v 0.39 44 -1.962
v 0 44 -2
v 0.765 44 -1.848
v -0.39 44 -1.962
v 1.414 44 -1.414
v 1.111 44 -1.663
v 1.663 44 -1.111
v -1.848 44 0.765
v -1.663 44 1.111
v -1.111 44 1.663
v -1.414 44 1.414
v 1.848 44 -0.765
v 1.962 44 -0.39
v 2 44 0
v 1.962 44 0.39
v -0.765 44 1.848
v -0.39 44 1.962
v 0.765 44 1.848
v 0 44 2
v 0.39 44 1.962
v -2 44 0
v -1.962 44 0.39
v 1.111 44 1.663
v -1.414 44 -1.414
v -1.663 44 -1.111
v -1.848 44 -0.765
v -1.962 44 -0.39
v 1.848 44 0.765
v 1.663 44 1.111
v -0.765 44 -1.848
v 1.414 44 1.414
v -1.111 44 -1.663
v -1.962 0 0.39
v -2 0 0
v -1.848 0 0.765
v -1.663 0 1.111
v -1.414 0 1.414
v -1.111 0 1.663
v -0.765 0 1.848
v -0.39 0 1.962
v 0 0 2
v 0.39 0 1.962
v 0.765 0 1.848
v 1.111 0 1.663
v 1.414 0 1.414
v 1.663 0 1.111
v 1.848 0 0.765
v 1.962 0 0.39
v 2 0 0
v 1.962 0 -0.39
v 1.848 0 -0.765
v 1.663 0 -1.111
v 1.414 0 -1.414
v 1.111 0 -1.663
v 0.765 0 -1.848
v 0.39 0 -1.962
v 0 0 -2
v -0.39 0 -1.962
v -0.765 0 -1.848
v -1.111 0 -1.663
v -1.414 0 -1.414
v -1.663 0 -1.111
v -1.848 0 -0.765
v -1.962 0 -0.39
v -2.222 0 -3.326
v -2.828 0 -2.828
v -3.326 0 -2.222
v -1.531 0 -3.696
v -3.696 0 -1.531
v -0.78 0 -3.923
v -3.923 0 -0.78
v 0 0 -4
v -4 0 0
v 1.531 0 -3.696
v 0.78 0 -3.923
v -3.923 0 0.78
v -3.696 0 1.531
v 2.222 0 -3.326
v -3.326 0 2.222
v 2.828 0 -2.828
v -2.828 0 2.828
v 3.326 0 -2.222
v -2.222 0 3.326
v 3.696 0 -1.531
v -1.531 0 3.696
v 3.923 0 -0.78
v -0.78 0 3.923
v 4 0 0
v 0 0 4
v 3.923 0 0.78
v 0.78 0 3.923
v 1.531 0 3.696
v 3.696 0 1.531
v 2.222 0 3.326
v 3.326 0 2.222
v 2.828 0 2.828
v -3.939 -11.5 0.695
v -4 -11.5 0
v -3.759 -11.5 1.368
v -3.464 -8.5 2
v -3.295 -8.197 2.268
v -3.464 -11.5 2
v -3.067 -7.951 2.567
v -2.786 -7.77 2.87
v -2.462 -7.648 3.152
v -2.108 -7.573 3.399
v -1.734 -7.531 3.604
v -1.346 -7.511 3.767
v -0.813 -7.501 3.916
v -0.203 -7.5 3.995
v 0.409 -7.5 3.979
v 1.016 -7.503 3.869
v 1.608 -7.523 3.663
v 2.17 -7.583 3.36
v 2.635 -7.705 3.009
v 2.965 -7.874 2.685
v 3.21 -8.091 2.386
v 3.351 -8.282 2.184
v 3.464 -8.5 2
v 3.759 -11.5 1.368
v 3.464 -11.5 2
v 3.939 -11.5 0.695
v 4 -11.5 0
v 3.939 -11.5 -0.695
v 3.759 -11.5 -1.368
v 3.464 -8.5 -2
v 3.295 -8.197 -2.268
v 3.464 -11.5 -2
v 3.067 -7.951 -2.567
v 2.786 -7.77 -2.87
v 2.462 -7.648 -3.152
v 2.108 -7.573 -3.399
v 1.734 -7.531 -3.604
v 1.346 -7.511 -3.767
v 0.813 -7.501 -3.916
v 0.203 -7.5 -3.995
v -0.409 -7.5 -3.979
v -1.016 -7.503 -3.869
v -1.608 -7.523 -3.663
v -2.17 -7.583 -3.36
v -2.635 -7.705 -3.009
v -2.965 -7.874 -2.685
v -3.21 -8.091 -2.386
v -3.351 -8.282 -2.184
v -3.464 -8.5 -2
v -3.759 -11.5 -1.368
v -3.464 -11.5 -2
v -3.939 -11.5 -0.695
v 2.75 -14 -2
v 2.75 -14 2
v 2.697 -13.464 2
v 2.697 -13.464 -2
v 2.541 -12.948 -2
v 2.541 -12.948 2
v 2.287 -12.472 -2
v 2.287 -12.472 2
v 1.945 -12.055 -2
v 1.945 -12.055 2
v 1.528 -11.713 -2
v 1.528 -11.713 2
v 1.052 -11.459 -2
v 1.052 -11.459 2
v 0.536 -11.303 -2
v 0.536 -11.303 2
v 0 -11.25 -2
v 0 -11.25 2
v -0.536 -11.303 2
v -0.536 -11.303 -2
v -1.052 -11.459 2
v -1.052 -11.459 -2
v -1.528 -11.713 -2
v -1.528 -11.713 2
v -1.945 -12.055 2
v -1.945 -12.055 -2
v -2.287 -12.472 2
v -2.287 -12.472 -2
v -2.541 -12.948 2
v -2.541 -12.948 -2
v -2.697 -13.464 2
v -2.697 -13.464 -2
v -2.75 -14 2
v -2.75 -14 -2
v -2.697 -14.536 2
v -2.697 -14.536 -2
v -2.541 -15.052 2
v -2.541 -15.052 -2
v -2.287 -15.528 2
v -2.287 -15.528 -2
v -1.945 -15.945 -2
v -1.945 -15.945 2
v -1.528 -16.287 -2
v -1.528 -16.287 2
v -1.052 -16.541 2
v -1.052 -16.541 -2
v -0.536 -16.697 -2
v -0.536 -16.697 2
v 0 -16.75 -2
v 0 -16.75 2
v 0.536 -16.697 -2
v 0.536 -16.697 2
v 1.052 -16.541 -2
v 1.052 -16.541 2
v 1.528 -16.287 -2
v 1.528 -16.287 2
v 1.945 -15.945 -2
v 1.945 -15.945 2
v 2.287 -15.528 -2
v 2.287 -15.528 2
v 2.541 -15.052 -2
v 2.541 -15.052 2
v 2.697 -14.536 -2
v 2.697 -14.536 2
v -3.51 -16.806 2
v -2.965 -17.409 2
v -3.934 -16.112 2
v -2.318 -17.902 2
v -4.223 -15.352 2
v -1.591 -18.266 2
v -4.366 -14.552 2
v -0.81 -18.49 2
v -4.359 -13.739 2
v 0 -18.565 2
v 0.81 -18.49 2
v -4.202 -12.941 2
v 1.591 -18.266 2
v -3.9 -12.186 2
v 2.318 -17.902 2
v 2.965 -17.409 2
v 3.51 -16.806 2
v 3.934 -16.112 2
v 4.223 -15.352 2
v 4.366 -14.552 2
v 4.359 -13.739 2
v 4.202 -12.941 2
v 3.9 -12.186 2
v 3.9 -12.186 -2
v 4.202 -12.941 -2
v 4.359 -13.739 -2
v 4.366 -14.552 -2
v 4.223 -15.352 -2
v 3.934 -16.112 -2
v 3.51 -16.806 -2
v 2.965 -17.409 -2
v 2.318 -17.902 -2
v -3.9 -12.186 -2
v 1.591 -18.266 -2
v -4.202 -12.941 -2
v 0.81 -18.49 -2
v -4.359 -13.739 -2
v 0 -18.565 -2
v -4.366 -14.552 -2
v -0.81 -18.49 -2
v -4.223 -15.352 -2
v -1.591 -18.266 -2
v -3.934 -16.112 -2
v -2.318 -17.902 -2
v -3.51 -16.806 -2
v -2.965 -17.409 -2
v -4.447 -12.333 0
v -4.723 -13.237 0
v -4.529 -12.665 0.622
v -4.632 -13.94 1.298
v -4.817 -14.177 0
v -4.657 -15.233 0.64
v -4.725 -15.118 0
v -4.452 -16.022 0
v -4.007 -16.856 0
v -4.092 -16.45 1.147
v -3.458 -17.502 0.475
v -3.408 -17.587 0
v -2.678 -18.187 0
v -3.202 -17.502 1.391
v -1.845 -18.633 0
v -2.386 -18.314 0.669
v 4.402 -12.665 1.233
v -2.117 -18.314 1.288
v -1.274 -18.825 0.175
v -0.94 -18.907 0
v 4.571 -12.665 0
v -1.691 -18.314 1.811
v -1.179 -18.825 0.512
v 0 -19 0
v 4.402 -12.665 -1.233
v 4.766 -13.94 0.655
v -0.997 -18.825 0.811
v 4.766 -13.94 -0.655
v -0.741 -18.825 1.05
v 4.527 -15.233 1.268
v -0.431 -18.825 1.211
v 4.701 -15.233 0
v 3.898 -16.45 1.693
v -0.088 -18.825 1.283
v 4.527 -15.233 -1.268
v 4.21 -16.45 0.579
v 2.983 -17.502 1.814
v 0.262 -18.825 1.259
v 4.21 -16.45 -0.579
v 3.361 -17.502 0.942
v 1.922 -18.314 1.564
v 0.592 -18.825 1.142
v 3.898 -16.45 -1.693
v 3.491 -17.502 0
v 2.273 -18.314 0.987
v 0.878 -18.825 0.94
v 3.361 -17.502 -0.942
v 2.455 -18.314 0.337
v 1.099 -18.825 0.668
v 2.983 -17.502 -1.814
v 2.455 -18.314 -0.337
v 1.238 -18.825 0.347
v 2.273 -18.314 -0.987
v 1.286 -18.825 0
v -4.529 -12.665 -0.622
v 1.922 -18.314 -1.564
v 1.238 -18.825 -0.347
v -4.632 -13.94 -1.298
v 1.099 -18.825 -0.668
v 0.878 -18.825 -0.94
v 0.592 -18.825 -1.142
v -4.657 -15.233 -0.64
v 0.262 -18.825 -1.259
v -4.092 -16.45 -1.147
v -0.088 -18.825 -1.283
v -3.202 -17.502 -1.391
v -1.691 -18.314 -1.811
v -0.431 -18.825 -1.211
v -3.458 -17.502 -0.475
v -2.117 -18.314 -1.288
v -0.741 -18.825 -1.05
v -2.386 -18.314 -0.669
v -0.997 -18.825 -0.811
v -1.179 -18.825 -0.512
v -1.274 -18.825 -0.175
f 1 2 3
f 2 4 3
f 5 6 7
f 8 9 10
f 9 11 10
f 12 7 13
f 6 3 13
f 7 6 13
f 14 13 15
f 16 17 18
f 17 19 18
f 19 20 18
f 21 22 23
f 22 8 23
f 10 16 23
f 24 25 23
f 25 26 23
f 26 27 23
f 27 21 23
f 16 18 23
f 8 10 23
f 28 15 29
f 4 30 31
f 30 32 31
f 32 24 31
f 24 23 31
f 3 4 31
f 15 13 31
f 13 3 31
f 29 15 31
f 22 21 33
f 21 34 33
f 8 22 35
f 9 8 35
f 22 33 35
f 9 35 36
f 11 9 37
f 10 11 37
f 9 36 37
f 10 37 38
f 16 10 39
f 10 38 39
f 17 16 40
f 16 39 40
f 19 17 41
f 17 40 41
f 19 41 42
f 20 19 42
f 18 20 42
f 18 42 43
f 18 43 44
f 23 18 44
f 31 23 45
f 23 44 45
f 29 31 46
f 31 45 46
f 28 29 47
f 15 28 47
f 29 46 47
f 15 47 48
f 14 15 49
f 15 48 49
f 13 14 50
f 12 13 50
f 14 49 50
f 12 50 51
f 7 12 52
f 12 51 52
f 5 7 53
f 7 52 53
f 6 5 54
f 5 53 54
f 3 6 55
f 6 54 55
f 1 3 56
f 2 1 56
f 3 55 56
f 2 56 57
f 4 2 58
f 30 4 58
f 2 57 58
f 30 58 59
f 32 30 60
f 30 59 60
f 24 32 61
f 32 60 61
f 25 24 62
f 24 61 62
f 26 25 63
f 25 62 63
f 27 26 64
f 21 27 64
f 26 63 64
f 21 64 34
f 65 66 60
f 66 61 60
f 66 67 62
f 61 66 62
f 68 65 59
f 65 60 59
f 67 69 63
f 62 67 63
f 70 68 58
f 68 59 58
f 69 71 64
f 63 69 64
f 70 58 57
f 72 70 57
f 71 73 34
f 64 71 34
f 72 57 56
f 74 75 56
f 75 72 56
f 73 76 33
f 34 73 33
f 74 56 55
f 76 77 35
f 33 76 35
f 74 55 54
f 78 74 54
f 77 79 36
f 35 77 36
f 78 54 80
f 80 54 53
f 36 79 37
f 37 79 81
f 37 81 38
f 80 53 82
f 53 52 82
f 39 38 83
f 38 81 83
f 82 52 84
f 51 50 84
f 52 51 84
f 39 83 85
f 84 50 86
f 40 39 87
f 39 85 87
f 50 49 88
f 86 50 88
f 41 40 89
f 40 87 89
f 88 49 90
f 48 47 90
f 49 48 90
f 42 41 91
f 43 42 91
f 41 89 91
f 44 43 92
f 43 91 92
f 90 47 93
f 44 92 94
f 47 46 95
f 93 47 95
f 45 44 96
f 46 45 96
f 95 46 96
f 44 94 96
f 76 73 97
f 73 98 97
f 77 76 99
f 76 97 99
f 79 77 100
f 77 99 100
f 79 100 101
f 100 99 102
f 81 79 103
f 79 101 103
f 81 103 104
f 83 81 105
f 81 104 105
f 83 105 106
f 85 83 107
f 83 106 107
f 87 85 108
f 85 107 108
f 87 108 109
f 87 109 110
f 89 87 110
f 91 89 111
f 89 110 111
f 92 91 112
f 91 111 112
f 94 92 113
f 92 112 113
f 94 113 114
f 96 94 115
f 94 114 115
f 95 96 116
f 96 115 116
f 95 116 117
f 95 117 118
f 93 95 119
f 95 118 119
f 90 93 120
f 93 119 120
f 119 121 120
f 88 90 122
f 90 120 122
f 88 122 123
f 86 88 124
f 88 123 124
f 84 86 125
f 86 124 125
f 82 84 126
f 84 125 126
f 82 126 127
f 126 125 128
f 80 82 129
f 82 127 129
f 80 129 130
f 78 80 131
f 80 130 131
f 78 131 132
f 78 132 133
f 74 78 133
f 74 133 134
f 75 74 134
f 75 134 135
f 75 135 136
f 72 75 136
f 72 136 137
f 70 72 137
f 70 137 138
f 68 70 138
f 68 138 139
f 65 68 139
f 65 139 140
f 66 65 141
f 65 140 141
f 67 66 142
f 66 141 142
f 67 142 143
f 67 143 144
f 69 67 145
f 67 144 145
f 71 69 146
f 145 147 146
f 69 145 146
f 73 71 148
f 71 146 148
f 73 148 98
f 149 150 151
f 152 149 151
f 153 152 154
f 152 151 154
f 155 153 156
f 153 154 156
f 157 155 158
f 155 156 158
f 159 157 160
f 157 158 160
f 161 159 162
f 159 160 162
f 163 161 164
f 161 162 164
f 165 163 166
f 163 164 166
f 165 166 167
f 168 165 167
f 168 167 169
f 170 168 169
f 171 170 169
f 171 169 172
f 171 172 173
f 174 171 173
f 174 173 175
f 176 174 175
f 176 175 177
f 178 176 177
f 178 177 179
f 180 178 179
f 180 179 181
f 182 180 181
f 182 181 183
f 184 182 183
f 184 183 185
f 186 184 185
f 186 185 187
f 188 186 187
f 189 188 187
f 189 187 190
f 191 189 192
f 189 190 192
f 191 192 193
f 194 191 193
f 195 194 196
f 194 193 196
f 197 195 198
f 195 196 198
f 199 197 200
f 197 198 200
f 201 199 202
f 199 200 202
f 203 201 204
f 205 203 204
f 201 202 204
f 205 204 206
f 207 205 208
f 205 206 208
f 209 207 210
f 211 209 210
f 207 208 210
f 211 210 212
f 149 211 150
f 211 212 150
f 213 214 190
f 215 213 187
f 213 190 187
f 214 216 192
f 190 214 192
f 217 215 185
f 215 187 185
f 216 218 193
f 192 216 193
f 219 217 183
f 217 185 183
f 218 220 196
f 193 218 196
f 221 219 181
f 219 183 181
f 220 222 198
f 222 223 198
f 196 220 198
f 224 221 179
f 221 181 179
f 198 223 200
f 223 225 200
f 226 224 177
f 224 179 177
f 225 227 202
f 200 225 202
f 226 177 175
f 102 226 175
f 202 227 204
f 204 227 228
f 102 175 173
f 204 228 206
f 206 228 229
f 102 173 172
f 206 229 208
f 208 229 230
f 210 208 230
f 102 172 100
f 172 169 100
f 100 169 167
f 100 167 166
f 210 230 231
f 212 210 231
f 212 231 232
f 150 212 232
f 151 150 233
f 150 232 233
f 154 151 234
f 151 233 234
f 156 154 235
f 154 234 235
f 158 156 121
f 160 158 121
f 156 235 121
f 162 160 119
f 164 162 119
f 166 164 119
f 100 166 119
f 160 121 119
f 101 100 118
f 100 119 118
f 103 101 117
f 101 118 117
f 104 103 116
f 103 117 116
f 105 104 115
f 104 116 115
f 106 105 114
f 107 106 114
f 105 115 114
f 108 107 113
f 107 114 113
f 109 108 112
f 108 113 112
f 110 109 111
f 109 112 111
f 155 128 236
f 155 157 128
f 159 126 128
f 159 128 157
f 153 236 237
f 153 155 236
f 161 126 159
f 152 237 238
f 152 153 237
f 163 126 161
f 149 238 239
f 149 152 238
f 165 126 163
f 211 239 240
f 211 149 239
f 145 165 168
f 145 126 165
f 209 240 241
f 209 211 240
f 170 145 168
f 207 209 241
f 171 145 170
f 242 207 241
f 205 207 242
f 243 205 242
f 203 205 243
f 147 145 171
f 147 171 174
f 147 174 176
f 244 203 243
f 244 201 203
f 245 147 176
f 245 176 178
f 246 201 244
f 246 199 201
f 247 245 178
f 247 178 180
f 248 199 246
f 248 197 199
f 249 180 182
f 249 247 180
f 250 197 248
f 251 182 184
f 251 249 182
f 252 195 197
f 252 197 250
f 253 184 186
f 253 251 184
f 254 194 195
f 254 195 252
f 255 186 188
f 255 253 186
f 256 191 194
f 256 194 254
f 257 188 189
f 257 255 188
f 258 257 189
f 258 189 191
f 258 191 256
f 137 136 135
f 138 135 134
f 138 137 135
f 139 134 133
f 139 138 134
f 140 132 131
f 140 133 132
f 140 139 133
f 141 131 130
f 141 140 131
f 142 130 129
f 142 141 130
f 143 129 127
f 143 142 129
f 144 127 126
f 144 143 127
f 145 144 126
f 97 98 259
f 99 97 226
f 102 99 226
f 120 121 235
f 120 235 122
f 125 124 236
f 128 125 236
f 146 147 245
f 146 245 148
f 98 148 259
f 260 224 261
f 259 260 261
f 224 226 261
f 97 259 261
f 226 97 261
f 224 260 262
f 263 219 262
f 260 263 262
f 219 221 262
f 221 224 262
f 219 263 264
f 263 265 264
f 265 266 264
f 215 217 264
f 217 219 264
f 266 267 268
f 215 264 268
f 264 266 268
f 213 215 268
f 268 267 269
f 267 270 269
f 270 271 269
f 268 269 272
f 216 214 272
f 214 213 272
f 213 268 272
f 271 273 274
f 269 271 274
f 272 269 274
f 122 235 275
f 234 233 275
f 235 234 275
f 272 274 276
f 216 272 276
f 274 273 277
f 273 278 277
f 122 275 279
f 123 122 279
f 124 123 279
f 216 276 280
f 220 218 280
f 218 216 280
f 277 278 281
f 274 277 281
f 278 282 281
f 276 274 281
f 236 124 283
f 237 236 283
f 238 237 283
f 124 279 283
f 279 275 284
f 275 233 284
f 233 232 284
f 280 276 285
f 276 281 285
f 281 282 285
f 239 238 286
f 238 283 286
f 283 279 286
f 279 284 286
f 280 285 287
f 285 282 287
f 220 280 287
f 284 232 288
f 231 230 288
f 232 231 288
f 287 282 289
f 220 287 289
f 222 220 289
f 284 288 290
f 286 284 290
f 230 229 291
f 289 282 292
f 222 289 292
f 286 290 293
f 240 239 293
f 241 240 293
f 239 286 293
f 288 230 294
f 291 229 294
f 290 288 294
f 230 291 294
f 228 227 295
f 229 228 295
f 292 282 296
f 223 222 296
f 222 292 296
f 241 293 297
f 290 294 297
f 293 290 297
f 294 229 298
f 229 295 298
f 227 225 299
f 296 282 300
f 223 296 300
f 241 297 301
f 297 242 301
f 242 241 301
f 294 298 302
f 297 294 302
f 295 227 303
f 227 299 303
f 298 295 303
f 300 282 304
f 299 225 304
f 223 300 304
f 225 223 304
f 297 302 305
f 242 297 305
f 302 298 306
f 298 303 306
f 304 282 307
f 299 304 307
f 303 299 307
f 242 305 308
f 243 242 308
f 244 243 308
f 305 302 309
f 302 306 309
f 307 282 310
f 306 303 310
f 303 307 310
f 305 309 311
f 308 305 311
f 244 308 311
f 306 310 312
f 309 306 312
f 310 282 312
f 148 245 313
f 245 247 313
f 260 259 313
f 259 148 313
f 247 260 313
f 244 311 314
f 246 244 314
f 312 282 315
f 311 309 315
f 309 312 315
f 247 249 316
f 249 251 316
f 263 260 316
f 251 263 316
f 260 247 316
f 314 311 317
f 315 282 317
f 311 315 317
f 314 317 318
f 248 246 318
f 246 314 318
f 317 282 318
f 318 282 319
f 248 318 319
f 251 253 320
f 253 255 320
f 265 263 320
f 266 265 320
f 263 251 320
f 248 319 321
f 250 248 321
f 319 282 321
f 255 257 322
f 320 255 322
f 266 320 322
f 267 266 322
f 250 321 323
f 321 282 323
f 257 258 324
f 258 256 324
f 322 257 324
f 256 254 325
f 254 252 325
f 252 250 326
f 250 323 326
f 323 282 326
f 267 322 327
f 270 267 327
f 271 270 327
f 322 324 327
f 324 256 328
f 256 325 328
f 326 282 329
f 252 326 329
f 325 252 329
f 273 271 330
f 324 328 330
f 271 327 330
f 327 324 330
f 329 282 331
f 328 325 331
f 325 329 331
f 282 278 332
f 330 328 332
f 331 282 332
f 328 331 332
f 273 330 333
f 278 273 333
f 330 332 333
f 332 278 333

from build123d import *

# Parameters (mm, degrees)
CUT_EXTRUDE1_DEPTH      = 5.816666667
CUT_EXTRUDE1_DEPTH_BACK = 10
SKETCH3_R               = 2.75
CUT_EXTRUDE2_DEPTH      = 3.0000001
CUT_EXTRUDE2_DEPTH_BACK = 7.0000001


with BuildPart() as part:
    # Sketch1 → Revolve1 (revolve)
    with BuildSketch(Plane.XY):
        with BuildLine():
            Line((0, 0), (0, 44))
            Line((0, 44), (-2, 44))
            Line((-2, 44), (-2, 0))
            Line((-2, 0), (-4, 0))
            Line((-4, 0), (-4, -11.5))
            ThreePointArc((-4, -11.5), (-4.25, -16.45), (0, -19))
            Line((0, -19), (0, 0))
        make_face()
    revolve(axis=Axis((0, 0, 0), (0, 1, 0)))

    # Sketch2 → Cut-Extrude1 (cut, two sides)
    with BuildSketch(Plane(origin=(0, 0, 0), x_dir=(0, 0, -1), z_dir=(1, 0, 0))) as cut_extrude1_sk:
        with BuildLine():
            ThreePointArc((-2, -8.5), (-2.881966011, -7.763932023), (-4, -7.5))
            Line((-4, -7.5), (-4, -8.077978136))
            ThreePointArc((-4, -8.077978136), (-6.041123222, -13.901532194), (-2, -18.56514549))
            Line((-2, -18.56514549), (-2, -11.5))
            Line((-2, -11.5), (-2, -8.5))
        make_face()
        with BuildLine():
            Line((4, -8.077978136), (4, -7.5))
            ThreePointArc((4, -7.5), (2.881966011, -7.763932023), (2, -8.5))
            Line((2, -8.5), (2, -11.5))
            Line((2, -11.5), (2, -18.56514549))
            ThreePointArc((2, -18.56514549), (6.041123222, -13.901532194), (4, -8.077978136))
        make_face()
    extrude(amount=CUT_EXTRUDE1_DEPTH, mode=Mode.SUBTRACT)
    extrude(cut_extrude1_sk.sketch, amount=-CUT_EXTRUDE1_DEPTH_BACK, mode=Mode.SUBTRACT)

    # Sketch3 → Cut-Extrude2 (cut, two sides)
    with BuildSketch(Plane.XY.offset(2)) as cut_extrude2_sk:
        with Locations((0, -14)):
            Circle(SKETCH3_R)
    extrude(amount=CUT_EXTRUDE2_DEPTH, mode=Mode.SUBTRACT)
    extrude(cut_extrude2_sk.sketch, amount=-CUT_EXTRUDE2_DEPTH_BACK, mode=Mode.SUBTRACT)


solid = part.part
